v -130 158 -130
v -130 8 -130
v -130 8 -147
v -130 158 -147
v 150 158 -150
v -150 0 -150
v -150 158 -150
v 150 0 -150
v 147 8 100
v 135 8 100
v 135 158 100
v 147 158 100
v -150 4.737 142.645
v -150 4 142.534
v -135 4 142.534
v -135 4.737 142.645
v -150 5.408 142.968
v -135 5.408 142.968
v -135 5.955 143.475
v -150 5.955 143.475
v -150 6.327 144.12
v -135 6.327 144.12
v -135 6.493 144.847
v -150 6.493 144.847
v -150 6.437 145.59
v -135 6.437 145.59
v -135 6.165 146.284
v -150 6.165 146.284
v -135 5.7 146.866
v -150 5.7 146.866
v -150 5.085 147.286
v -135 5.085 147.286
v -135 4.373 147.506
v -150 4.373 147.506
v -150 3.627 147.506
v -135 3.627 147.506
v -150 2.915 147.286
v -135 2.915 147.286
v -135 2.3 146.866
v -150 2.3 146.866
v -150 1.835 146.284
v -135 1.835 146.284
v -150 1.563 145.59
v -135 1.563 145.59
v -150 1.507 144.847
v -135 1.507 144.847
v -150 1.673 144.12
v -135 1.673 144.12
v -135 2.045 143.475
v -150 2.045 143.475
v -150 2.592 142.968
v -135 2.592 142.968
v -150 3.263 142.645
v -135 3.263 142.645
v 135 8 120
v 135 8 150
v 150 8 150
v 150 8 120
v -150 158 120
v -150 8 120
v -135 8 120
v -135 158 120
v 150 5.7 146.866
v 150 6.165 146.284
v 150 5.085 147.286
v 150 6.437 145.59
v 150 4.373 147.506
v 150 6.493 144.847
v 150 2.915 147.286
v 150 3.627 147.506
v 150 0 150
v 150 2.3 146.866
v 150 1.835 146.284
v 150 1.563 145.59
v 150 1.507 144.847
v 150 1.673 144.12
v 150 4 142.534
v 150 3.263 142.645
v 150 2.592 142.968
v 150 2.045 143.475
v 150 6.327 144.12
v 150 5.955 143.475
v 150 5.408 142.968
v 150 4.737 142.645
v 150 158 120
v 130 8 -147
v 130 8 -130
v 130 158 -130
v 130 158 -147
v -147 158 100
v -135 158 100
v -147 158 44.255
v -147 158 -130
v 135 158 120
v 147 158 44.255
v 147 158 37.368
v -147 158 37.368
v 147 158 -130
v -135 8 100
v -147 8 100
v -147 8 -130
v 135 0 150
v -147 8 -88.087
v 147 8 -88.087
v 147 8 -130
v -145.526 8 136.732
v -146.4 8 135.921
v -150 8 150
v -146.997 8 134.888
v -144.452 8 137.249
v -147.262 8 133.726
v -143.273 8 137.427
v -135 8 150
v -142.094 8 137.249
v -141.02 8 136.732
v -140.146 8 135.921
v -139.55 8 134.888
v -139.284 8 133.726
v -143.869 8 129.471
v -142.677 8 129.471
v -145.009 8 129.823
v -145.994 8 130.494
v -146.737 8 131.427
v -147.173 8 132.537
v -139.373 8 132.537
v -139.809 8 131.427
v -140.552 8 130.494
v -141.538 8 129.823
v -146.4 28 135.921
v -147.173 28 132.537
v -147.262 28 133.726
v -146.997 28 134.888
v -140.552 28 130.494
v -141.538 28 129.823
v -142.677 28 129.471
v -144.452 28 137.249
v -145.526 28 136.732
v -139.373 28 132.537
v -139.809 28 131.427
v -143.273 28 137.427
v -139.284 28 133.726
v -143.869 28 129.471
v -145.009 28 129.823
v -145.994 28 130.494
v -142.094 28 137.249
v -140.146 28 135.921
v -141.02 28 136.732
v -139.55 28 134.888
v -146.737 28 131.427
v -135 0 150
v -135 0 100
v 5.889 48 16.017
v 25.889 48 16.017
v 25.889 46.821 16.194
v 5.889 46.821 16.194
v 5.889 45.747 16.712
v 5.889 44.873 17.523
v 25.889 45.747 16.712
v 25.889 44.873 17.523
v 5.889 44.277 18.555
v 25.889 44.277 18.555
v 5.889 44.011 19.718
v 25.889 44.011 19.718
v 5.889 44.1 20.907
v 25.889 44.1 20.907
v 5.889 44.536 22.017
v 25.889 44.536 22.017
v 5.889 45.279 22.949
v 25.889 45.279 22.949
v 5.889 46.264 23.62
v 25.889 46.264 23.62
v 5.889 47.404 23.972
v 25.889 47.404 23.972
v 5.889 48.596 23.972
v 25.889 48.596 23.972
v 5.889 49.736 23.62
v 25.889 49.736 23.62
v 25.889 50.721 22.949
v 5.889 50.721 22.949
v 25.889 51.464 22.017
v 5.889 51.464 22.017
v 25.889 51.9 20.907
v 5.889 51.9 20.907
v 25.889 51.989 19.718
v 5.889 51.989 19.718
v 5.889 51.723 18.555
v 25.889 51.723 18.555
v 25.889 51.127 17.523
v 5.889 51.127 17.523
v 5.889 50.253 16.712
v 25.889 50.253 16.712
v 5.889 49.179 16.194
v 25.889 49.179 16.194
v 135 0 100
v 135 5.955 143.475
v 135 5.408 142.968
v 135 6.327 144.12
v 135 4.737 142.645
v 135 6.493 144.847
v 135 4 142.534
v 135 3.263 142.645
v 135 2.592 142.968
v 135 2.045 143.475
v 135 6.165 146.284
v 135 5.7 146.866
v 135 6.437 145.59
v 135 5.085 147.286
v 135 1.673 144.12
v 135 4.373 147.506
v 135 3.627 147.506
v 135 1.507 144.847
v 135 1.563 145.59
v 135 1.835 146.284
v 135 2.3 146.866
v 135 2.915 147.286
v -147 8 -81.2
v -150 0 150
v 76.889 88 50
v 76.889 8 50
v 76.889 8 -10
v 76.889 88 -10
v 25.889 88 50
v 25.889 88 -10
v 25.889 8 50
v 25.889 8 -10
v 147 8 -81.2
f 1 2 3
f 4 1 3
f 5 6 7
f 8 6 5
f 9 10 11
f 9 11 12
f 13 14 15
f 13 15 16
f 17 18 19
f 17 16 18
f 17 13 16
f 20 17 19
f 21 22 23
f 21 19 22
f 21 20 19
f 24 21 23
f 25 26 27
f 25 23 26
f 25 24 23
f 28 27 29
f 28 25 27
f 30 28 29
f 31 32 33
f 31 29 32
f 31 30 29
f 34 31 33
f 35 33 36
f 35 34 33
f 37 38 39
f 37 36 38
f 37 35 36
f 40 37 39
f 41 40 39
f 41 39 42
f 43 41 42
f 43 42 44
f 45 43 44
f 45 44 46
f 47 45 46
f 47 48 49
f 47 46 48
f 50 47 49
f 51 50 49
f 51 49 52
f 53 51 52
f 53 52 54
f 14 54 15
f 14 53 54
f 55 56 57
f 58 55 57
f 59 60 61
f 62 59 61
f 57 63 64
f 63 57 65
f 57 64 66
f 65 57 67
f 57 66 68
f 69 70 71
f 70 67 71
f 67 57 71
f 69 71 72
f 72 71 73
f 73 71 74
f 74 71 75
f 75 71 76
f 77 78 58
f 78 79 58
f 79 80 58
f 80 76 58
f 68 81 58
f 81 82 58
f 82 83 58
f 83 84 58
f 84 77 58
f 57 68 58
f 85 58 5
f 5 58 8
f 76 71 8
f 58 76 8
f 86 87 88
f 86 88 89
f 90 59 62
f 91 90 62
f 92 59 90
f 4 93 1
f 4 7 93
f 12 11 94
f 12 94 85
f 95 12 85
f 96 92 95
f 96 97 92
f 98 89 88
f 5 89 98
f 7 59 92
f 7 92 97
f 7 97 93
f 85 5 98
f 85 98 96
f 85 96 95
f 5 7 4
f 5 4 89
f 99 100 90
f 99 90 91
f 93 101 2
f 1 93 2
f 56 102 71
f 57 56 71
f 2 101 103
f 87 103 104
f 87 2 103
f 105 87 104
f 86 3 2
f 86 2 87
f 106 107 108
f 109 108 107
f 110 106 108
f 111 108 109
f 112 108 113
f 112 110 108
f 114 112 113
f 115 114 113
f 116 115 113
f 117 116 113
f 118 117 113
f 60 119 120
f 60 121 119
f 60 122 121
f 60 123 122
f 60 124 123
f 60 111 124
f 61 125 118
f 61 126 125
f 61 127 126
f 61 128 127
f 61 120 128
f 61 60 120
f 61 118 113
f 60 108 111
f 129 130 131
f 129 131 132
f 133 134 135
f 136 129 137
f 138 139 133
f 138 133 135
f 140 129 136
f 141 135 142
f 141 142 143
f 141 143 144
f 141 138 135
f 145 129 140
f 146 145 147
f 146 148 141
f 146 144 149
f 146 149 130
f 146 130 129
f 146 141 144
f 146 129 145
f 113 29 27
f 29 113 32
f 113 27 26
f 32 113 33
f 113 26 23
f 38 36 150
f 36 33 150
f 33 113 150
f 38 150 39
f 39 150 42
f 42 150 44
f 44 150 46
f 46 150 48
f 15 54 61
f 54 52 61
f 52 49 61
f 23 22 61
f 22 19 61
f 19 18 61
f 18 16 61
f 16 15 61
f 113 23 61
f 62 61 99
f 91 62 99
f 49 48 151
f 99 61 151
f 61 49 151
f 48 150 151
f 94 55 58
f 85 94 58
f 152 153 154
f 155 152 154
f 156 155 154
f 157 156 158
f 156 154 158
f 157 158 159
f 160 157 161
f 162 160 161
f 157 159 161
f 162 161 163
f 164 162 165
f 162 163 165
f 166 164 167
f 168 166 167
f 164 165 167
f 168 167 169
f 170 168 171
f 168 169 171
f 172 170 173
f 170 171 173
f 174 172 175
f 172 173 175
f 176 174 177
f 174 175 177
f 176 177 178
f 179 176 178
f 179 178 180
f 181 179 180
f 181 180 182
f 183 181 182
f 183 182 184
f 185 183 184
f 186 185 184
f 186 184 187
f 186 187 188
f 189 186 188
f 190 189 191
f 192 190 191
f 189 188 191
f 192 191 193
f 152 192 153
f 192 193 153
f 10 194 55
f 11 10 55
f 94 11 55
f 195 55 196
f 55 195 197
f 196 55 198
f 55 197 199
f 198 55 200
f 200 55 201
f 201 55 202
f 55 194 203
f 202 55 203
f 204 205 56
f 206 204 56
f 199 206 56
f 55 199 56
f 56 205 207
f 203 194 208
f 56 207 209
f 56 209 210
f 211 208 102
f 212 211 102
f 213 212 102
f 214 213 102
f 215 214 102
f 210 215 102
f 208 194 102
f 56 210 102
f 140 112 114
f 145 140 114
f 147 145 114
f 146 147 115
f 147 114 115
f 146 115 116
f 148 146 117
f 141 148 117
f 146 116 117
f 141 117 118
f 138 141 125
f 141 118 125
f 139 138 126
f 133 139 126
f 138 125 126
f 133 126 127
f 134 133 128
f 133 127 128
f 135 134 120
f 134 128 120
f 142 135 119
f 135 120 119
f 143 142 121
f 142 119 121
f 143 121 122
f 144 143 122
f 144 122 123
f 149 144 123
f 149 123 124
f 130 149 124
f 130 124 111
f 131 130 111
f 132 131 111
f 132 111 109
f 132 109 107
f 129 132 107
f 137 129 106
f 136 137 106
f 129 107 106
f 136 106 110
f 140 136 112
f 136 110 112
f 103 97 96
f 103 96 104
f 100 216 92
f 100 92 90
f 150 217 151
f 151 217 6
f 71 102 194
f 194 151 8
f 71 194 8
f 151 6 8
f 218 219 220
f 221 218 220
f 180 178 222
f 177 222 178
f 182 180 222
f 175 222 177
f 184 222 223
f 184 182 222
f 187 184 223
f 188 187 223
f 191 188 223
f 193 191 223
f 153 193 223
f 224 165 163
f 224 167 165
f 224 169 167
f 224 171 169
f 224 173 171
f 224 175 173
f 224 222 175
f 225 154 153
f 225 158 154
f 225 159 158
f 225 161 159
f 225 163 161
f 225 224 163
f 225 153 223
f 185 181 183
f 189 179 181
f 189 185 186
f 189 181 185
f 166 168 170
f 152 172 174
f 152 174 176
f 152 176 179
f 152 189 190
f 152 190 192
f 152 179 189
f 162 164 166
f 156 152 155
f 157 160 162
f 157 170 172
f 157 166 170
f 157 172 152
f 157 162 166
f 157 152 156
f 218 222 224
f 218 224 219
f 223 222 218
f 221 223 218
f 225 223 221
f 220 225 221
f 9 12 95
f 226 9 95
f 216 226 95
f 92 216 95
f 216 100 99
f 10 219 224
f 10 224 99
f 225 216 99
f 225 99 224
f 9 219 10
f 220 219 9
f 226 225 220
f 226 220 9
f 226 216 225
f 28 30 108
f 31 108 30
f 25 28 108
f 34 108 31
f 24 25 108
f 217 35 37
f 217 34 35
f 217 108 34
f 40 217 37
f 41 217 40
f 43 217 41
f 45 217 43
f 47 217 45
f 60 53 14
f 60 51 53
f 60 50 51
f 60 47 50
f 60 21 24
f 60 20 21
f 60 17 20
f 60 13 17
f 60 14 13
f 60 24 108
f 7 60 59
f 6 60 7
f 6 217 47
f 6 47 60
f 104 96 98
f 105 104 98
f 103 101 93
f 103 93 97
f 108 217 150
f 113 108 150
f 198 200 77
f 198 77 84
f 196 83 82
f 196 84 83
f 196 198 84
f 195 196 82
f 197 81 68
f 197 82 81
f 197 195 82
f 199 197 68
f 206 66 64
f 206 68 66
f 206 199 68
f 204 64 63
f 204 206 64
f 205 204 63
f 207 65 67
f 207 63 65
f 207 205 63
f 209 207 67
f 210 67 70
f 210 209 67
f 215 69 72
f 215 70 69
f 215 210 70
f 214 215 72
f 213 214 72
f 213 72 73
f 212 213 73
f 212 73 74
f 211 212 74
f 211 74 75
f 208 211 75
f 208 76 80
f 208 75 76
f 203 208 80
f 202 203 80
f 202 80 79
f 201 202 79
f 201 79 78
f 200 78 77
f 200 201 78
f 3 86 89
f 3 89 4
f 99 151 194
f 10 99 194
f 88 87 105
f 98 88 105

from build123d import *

# Parameters (mm, degrees)
BOSS_EXTRUDE1_DEPTH     = 8
CUT_EXTRUDE1_DEPTH      = 213.282830205
CUT_EXTRUDE1_DEPTH_BACK = 213.282830205
SKETCH2_R               = 2.5
SKETCH3_W               = 20
SKETCH3_H               = 20
SKETCH3_W_2             = 15
BOSS_EXTRUDE2_DEPTH     = 150
BOSS_EXTRUDE3_DEPTH     = 150
SKETCH5_W               = 51
SKETCH5_H               = 60
BOSS_EXTRUDE4_DEPTH     = 80
SKETCH7_R               = 4
BOSS_EXTRUDE5_DEPTH     = 20
BOSS_EXTRUDE6_REACH     = 372.761
SKETCH9_R               = 4
BOSS_EXTRUDE7_DEPTH     = 20


with BuildPart() as part:
    # Sketch1 → Boss-Extrude1 (new body)
    with BuildSketch(Plane(origin=(0, 0, 0), x_dir=(1, 0, 0), z_dir=(0, 1, 0))):
        Polygon((135, -150), (150, -150), (150, 150), (-150, 150), (-150, -150), (-135, -150), (-135, -100), (135, -100), align=None)
    extrude(amount=BOSS_EXTRUDE1_DEPTH)

    # Sketch2 → Cut-Extrude1 (cut, two sides: drawn at the far end of the back side and taken through both)
    with BuildSketch(Plane(origin=(0, 0, 0), x_dir=(0, 0, -1), z_dir=(1, 0, 0)).offset(-CUT_EXTRUDE1_DEPTH_BACK)):
        with Locations((-145.033528283, 4)):
            Circle(SKETCH2_R)
    extrude(amount=CUT_EXTRUDE1_DEPTH + CUT_EXTRUDE1_DEPTH_BACK, mode=Mode.SUBTRACT)

    # Sketch3 → Boss-Extrude2 (add)
    with BuildSketch(Plane(origin=(0, 8, 0), x_dir=(1, 0, 0), z_dir=(0, 1, 0))):
        with Locations((-140, 140)):
            Rectangle(SKETCH3_W, SKETCH3_H)
        with Locations((140, 140)):
            Rectangle(SKETCH3_W, SKETCH3_H)
        with Locations((142.5, -110)):
            Rectangle(SKETCH3_W_2, SKETCH3_H)
        with Locations((-142.5, -110)):
            Rectangle(SKETCH3_W_2, SKETCH3_H)
    extrude(amount=BOSS_EXTRUDE2_DEPTH)

    # Sketch4 → Boss-Extrude3 (add)
    with BuildSketch(Plane(origin=(0, 8, 0), x_dir=(1, 0, 0), z_dir=(0, 1, 0))):
        Polygon((-147, 147), (-147, -117), (-150, -120), (-150, 150), (150, 150), (150, -120), (147, -117), (147, 147), align=None)
    extrude(amount=BOSS_EXTRUDE3_DEPTH)

    # Sketch5 → Boss-Extrude4 (add)
    with BuildSketch(Plane(origin=(0, 8, 0), x_dir=(1, 0, 0), z_dir=(0, 1, 0))):
        with Locations((51.38892732, -20)):
            Rectangle(SKETCH5_W, SKETCH5_H)
    extrude(amount=BOSS_EXTRUDE4_DEPTH)

    # Sketch7 → Boss-Extrude5 (add)
    with BuildSketch(Plane.ZY.offset(-25.88892732)):
        with Locations(Location((20.016570429, 48, 0), (0, 0, 180))):
            Circle(SKETCH7_R)
    extrude(amount=BOSS_EXTRUDE5_DEPTH)

    # Sketch8 → Boss-Extrude6 (add, up to next)
    with BuildSketch(Plane.ZY.offset(150), mode=Mode.PRIVATE) as boss_extrude6_sk1:
        Polygon((37.367547096, 158), (-94.778166859, 0), (-87.891172035, 0), (44.254541919, 158), align=None)
    boss_extrude6_tool1 = extrude(boss_extrude6_sk1.sketch, amount=-BOSS_EXTRUDE6_REACH, mode=Mode.PRIVATE) - part.part
    add(boss_extrude6_tool1.solids().sort_by_distance((-150, 79, -25.261812))[0])

    # Sketch9 → Boss-Extrude7 (add)
    with BuildSketch(Plane(origin=(0, 8, 0), x_dir=(1, 0, 0), z_dir=(0, 1, 0))):
        with Locations(Location((-143.273126196, -133.426649838, 0), (0, 0, 270))):
            Circle(SKETCH9_R)
    extrude(amount=BOSS_EXTRUDE7_DEPTH)


solid = part.part
